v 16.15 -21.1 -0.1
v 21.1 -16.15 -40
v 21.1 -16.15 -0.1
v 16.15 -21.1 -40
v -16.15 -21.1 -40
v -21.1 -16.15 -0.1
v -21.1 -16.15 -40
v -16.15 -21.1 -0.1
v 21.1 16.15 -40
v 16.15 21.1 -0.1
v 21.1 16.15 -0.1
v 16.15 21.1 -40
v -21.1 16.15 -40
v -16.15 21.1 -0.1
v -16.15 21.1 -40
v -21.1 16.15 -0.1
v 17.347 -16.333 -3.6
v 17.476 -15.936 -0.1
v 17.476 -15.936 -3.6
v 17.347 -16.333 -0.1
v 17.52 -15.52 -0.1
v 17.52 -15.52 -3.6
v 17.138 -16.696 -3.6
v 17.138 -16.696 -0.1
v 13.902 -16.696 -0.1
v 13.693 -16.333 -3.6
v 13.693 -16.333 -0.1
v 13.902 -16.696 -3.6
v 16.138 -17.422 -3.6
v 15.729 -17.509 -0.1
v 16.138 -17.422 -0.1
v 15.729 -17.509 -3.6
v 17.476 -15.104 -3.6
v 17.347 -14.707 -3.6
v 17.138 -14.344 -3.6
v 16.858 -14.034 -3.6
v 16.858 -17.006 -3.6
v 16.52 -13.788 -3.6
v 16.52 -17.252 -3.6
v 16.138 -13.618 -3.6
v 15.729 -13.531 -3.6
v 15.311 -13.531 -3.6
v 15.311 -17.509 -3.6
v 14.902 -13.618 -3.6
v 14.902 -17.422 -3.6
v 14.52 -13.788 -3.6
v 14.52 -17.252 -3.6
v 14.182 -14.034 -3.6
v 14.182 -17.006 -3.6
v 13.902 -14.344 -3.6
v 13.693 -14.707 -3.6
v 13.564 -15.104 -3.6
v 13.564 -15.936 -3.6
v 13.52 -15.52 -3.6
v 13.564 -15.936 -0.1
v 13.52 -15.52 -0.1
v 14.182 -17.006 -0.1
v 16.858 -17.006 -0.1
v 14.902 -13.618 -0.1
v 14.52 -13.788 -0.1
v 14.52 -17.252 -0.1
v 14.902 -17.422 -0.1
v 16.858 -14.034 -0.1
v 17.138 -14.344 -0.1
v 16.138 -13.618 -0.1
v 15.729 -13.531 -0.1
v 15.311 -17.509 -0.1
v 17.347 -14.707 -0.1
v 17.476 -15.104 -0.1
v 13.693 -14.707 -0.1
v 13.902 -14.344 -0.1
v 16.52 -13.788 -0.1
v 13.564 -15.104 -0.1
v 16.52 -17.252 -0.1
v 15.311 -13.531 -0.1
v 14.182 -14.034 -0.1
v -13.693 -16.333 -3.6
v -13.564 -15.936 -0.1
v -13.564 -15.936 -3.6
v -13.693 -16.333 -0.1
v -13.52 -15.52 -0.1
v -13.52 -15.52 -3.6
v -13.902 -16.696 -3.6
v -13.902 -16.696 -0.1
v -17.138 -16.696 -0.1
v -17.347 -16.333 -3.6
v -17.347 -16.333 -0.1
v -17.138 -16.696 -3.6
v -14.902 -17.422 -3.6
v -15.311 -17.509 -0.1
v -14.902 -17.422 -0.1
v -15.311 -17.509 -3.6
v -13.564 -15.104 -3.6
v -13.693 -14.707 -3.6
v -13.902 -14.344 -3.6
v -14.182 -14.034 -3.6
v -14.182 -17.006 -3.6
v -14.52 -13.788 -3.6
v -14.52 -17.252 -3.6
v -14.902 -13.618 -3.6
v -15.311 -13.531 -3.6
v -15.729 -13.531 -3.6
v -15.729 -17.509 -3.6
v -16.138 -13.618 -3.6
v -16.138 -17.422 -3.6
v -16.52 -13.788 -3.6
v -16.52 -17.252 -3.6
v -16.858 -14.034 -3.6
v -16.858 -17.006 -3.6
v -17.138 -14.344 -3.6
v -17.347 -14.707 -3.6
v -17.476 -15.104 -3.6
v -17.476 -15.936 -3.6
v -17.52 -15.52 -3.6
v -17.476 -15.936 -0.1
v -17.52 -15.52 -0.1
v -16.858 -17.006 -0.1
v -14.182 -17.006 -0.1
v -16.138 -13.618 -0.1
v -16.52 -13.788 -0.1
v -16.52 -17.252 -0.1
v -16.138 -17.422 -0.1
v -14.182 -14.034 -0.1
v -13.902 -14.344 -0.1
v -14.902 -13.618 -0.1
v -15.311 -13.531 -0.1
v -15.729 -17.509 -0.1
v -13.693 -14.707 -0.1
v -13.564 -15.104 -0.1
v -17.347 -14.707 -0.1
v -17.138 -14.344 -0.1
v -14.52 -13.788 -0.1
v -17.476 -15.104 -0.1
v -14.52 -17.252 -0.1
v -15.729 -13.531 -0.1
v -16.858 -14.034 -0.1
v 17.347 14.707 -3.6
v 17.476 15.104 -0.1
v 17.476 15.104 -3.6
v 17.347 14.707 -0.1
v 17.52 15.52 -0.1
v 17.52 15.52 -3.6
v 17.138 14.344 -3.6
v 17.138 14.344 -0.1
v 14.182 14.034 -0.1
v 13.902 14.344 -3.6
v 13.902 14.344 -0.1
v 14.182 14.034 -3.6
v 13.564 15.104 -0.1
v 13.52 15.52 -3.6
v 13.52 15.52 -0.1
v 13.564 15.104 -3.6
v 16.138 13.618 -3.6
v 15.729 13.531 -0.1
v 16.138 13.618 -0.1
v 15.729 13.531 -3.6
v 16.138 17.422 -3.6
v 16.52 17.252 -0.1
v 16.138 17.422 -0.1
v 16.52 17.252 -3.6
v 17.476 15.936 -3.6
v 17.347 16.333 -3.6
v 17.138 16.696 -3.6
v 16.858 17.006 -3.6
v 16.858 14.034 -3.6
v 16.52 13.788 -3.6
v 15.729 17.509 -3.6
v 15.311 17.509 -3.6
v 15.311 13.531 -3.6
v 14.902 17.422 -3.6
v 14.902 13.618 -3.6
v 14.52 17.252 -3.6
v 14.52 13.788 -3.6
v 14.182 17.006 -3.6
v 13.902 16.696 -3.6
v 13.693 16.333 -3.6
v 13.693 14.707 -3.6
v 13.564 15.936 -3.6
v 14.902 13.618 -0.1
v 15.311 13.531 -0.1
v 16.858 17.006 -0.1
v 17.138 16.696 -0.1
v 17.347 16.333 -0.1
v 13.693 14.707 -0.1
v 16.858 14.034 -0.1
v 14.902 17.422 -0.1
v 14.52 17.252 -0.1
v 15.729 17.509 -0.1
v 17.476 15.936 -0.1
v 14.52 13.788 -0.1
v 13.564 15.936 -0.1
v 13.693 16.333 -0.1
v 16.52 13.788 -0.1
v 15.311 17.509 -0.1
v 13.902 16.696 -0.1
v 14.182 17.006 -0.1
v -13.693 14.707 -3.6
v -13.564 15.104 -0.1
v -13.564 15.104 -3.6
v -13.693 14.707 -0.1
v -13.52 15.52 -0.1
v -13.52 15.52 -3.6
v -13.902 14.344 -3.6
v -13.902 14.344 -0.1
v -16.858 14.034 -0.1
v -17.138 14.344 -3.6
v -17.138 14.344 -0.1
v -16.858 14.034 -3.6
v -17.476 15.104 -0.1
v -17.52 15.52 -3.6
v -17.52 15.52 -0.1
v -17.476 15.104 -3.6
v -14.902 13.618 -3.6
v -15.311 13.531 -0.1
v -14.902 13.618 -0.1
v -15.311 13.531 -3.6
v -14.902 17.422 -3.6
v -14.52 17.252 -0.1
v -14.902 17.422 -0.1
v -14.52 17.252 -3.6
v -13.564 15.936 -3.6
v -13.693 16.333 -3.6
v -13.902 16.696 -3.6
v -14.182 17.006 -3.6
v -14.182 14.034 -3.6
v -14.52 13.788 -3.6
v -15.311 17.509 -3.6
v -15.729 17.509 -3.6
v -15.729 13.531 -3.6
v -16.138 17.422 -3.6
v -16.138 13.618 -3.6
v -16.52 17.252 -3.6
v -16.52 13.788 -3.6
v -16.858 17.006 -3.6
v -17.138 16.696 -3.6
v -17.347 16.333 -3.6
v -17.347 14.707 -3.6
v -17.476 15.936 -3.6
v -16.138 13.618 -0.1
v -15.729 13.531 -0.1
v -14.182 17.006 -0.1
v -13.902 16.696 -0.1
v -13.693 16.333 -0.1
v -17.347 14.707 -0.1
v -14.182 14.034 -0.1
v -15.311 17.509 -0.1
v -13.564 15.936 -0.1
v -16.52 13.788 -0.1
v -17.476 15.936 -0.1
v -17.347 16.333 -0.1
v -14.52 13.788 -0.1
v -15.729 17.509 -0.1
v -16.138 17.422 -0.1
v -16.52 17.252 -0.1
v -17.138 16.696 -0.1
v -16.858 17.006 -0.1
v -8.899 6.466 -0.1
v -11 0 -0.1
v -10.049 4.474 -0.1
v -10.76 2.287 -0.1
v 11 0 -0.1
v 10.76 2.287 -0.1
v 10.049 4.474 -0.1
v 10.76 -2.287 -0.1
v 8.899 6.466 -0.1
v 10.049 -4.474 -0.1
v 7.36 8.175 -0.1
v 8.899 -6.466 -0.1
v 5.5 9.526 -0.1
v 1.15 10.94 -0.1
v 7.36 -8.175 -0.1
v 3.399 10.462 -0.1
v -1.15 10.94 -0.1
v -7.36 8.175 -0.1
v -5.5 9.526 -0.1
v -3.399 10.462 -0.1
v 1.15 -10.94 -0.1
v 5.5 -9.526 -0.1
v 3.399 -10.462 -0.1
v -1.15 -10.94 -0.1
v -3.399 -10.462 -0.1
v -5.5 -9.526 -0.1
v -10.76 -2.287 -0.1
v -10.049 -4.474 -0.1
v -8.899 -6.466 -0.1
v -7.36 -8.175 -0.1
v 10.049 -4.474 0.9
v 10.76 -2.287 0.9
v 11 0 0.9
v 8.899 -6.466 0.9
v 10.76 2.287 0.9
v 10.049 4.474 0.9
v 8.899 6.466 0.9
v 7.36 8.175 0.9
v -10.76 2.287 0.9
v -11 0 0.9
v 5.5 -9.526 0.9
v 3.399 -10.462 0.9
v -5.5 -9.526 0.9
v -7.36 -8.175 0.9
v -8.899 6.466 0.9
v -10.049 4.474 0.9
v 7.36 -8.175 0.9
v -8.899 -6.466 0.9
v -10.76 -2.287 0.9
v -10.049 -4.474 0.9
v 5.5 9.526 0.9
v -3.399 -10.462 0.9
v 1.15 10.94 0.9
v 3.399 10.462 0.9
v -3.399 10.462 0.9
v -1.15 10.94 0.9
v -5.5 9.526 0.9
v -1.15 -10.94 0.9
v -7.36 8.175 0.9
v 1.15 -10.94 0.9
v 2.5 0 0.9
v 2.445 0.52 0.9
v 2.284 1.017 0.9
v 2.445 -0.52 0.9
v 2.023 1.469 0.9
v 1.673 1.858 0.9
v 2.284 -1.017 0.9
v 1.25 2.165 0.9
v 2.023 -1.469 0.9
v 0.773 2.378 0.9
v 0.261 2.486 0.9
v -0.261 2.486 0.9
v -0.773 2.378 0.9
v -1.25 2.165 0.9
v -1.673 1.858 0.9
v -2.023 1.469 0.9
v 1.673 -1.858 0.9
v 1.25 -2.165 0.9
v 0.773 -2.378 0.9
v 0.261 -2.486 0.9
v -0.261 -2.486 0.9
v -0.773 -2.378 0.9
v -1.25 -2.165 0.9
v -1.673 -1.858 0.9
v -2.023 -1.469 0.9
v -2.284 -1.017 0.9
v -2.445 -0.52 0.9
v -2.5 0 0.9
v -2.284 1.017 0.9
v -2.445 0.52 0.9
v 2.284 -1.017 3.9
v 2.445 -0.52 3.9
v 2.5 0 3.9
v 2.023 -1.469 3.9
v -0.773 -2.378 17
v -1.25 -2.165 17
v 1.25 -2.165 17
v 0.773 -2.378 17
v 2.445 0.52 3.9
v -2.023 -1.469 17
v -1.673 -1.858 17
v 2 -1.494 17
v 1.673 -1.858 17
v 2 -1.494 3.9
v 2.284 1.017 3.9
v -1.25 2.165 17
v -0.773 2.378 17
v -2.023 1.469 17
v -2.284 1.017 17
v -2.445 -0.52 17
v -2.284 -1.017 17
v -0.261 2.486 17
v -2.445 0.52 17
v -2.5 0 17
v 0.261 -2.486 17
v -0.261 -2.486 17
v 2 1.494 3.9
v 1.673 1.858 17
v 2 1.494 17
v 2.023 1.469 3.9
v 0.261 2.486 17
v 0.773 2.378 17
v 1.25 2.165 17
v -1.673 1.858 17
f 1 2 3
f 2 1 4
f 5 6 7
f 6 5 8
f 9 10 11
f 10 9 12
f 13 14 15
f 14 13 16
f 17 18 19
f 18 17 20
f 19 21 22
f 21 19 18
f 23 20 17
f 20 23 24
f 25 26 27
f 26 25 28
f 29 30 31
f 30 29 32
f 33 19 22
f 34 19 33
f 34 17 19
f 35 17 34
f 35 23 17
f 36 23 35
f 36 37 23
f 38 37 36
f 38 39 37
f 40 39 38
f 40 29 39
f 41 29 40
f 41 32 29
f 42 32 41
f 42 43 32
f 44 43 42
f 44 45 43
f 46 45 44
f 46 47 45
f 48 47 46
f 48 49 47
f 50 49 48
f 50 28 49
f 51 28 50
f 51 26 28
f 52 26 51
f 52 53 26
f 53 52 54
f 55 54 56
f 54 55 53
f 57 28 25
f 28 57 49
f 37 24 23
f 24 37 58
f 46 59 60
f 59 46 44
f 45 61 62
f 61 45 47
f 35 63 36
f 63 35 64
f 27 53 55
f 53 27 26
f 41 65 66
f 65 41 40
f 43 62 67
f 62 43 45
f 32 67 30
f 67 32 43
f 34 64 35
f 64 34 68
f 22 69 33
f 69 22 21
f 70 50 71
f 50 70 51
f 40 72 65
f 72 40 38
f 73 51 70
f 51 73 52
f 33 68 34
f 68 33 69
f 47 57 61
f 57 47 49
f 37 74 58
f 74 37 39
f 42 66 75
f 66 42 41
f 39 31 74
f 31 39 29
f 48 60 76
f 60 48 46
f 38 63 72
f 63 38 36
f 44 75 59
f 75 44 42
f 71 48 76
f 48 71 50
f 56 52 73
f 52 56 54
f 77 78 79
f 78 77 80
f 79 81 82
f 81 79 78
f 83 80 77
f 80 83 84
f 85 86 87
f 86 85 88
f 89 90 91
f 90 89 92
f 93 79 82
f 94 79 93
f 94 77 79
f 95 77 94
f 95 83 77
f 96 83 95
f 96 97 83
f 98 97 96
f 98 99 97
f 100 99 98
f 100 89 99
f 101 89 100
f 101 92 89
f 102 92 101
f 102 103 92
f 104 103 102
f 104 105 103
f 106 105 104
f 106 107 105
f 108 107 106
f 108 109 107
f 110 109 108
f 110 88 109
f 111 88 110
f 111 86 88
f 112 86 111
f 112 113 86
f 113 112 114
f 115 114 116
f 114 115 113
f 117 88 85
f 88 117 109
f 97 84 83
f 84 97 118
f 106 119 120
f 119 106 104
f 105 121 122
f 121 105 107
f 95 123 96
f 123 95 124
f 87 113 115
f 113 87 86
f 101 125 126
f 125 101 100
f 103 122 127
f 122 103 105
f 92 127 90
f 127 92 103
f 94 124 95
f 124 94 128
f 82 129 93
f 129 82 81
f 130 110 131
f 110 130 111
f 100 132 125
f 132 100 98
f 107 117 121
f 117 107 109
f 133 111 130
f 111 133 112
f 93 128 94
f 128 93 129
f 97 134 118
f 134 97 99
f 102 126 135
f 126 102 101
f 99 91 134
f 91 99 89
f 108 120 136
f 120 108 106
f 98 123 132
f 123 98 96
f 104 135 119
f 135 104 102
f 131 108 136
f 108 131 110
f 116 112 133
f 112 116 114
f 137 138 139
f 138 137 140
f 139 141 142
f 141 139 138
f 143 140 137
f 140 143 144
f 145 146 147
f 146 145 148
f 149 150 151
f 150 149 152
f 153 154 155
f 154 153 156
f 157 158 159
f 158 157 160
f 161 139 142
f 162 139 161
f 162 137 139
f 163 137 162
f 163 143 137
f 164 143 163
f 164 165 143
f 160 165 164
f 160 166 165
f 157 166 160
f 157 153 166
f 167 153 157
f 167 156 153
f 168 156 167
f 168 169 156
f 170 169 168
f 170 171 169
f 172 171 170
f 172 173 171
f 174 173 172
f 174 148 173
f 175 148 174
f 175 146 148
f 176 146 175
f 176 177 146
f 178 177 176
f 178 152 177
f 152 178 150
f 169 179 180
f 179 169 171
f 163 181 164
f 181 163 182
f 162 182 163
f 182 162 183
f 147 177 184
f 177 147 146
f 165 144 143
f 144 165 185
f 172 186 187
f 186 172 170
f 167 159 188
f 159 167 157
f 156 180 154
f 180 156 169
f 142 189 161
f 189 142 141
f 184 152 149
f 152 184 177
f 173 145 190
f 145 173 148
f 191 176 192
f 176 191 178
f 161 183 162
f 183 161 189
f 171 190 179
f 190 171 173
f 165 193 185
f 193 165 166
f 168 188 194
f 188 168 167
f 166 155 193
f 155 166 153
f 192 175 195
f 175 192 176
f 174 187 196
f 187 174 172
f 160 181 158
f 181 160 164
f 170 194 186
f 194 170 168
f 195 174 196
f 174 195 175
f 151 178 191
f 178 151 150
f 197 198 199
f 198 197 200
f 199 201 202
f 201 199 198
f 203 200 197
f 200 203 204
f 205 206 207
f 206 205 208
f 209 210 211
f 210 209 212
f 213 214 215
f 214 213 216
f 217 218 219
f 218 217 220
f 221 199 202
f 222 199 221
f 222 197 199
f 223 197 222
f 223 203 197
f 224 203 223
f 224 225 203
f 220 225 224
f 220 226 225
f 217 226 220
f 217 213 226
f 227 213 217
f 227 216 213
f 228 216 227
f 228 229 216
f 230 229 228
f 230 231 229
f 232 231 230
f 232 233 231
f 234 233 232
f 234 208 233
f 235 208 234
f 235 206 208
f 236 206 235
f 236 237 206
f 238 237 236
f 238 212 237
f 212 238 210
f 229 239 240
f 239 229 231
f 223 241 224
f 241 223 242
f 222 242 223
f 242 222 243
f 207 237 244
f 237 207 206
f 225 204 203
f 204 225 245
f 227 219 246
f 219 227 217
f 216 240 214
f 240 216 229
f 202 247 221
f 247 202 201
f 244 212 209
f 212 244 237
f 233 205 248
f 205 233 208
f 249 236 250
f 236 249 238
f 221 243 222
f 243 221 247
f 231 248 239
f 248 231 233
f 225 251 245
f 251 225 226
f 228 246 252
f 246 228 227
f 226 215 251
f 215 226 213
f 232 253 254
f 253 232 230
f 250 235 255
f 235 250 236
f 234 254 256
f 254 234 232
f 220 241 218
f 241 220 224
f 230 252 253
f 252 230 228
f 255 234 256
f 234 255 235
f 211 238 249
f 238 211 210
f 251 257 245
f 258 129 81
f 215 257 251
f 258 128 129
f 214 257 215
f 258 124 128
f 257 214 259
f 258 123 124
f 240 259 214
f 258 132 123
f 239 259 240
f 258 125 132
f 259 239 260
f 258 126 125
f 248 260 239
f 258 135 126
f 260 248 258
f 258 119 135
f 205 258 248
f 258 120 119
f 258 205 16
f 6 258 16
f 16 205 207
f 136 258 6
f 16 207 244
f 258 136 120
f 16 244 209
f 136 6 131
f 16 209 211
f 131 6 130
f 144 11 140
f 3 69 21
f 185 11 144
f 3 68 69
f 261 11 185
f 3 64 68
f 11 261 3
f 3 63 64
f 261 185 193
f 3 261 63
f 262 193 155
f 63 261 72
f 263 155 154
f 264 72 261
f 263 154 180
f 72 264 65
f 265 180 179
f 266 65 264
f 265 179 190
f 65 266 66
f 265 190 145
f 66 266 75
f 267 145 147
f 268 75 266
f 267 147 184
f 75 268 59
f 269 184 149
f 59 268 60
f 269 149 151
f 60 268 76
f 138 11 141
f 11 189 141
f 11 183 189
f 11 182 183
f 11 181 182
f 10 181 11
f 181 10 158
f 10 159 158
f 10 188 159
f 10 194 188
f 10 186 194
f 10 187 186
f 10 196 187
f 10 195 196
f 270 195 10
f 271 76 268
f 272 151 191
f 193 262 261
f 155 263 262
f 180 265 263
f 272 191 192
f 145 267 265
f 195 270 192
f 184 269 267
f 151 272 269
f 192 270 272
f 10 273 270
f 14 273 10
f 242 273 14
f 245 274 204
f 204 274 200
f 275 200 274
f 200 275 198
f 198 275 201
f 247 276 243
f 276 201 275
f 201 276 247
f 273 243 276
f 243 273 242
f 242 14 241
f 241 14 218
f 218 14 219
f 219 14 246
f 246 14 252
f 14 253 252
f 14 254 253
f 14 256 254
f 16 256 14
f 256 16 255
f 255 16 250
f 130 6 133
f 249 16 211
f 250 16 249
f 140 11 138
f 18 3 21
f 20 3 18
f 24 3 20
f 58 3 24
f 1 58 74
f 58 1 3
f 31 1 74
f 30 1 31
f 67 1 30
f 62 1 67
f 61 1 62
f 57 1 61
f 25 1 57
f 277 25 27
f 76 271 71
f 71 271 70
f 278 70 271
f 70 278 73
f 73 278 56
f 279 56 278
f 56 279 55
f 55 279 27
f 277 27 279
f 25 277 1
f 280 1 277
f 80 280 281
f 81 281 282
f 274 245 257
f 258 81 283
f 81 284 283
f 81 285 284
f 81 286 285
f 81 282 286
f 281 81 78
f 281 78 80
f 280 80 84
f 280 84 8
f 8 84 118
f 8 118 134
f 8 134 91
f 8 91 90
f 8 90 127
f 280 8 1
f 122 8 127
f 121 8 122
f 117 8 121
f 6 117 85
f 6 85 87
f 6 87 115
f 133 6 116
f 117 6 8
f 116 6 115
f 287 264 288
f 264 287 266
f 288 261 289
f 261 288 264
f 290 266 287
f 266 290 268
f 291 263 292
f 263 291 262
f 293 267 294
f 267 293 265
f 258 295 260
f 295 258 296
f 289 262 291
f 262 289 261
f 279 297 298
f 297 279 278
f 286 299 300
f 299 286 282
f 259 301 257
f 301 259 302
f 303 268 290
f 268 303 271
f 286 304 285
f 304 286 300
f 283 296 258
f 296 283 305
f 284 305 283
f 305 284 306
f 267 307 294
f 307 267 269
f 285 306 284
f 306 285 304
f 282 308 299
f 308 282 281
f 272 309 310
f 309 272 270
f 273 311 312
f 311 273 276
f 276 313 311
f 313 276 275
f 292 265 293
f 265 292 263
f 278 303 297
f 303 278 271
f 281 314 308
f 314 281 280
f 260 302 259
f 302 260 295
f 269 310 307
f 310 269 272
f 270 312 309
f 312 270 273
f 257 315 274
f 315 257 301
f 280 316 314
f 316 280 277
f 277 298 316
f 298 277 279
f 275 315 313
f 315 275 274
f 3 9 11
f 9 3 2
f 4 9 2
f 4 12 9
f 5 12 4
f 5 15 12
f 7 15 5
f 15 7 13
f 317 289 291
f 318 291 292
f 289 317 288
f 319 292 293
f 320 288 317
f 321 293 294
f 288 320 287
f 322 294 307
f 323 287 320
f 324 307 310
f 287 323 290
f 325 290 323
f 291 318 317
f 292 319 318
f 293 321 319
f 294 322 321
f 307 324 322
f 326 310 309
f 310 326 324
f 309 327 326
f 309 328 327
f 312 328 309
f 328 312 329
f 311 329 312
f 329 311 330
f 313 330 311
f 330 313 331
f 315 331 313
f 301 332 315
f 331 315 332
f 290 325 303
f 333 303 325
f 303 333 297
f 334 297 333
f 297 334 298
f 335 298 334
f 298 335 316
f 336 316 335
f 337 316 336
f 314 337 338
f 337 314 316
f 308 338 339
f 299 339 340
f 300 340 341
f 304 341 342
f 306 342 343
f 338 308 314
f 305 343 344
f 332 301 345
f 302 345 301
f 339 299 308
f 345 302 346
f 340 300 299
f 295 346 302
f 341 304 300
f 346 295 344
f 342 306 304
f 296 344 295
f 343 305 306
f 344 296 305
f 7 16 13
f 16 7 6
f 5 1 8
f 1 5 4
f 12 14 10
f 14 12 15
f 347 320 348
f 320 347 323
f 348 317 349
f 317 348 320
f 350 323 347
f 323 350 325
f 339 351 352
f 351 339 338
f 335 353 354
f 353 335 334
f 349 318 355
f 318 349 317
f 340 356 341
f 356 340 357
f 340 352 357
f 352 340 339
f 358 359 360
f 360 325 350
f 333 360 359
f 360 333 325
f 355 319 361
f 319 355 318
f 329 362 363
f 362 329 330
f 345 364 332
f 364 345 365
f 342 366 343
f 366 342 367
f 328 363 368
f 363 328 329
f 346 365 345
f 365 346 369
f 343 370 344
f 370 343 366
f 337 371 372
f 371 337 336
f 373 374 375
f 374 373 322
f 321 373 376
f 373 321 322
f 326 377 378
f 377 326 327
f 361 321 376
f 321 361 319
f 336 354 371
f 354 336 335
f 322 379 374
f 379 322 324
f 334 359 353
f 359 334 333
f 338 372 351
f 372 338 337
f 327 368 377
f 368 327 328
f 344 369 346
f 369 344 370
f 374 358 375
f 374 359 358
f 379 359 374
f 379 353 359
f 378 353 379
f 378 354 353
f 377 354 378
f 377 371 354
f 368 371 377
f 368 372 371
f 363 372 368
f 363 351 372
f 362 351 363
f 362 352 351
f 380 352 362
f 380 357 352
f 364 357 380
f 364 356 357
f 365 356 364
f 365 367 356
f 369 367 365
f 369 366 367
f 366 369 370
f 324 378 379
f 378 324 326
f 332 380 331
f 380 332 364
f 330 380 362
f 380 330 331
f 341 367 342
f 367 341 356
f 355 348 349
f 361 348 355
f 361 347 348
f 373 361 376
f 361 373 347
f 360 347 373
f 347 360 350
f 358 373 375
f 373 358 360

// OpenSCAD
// NAME: Nema 17 Motor
// CATEGORY: Electric Motor
// COLOR: 493

include <MCAD/stepper.scad>
motor(Nema17, pos=[0, 0, 0.9], orientation=[180, 0, 0]);
